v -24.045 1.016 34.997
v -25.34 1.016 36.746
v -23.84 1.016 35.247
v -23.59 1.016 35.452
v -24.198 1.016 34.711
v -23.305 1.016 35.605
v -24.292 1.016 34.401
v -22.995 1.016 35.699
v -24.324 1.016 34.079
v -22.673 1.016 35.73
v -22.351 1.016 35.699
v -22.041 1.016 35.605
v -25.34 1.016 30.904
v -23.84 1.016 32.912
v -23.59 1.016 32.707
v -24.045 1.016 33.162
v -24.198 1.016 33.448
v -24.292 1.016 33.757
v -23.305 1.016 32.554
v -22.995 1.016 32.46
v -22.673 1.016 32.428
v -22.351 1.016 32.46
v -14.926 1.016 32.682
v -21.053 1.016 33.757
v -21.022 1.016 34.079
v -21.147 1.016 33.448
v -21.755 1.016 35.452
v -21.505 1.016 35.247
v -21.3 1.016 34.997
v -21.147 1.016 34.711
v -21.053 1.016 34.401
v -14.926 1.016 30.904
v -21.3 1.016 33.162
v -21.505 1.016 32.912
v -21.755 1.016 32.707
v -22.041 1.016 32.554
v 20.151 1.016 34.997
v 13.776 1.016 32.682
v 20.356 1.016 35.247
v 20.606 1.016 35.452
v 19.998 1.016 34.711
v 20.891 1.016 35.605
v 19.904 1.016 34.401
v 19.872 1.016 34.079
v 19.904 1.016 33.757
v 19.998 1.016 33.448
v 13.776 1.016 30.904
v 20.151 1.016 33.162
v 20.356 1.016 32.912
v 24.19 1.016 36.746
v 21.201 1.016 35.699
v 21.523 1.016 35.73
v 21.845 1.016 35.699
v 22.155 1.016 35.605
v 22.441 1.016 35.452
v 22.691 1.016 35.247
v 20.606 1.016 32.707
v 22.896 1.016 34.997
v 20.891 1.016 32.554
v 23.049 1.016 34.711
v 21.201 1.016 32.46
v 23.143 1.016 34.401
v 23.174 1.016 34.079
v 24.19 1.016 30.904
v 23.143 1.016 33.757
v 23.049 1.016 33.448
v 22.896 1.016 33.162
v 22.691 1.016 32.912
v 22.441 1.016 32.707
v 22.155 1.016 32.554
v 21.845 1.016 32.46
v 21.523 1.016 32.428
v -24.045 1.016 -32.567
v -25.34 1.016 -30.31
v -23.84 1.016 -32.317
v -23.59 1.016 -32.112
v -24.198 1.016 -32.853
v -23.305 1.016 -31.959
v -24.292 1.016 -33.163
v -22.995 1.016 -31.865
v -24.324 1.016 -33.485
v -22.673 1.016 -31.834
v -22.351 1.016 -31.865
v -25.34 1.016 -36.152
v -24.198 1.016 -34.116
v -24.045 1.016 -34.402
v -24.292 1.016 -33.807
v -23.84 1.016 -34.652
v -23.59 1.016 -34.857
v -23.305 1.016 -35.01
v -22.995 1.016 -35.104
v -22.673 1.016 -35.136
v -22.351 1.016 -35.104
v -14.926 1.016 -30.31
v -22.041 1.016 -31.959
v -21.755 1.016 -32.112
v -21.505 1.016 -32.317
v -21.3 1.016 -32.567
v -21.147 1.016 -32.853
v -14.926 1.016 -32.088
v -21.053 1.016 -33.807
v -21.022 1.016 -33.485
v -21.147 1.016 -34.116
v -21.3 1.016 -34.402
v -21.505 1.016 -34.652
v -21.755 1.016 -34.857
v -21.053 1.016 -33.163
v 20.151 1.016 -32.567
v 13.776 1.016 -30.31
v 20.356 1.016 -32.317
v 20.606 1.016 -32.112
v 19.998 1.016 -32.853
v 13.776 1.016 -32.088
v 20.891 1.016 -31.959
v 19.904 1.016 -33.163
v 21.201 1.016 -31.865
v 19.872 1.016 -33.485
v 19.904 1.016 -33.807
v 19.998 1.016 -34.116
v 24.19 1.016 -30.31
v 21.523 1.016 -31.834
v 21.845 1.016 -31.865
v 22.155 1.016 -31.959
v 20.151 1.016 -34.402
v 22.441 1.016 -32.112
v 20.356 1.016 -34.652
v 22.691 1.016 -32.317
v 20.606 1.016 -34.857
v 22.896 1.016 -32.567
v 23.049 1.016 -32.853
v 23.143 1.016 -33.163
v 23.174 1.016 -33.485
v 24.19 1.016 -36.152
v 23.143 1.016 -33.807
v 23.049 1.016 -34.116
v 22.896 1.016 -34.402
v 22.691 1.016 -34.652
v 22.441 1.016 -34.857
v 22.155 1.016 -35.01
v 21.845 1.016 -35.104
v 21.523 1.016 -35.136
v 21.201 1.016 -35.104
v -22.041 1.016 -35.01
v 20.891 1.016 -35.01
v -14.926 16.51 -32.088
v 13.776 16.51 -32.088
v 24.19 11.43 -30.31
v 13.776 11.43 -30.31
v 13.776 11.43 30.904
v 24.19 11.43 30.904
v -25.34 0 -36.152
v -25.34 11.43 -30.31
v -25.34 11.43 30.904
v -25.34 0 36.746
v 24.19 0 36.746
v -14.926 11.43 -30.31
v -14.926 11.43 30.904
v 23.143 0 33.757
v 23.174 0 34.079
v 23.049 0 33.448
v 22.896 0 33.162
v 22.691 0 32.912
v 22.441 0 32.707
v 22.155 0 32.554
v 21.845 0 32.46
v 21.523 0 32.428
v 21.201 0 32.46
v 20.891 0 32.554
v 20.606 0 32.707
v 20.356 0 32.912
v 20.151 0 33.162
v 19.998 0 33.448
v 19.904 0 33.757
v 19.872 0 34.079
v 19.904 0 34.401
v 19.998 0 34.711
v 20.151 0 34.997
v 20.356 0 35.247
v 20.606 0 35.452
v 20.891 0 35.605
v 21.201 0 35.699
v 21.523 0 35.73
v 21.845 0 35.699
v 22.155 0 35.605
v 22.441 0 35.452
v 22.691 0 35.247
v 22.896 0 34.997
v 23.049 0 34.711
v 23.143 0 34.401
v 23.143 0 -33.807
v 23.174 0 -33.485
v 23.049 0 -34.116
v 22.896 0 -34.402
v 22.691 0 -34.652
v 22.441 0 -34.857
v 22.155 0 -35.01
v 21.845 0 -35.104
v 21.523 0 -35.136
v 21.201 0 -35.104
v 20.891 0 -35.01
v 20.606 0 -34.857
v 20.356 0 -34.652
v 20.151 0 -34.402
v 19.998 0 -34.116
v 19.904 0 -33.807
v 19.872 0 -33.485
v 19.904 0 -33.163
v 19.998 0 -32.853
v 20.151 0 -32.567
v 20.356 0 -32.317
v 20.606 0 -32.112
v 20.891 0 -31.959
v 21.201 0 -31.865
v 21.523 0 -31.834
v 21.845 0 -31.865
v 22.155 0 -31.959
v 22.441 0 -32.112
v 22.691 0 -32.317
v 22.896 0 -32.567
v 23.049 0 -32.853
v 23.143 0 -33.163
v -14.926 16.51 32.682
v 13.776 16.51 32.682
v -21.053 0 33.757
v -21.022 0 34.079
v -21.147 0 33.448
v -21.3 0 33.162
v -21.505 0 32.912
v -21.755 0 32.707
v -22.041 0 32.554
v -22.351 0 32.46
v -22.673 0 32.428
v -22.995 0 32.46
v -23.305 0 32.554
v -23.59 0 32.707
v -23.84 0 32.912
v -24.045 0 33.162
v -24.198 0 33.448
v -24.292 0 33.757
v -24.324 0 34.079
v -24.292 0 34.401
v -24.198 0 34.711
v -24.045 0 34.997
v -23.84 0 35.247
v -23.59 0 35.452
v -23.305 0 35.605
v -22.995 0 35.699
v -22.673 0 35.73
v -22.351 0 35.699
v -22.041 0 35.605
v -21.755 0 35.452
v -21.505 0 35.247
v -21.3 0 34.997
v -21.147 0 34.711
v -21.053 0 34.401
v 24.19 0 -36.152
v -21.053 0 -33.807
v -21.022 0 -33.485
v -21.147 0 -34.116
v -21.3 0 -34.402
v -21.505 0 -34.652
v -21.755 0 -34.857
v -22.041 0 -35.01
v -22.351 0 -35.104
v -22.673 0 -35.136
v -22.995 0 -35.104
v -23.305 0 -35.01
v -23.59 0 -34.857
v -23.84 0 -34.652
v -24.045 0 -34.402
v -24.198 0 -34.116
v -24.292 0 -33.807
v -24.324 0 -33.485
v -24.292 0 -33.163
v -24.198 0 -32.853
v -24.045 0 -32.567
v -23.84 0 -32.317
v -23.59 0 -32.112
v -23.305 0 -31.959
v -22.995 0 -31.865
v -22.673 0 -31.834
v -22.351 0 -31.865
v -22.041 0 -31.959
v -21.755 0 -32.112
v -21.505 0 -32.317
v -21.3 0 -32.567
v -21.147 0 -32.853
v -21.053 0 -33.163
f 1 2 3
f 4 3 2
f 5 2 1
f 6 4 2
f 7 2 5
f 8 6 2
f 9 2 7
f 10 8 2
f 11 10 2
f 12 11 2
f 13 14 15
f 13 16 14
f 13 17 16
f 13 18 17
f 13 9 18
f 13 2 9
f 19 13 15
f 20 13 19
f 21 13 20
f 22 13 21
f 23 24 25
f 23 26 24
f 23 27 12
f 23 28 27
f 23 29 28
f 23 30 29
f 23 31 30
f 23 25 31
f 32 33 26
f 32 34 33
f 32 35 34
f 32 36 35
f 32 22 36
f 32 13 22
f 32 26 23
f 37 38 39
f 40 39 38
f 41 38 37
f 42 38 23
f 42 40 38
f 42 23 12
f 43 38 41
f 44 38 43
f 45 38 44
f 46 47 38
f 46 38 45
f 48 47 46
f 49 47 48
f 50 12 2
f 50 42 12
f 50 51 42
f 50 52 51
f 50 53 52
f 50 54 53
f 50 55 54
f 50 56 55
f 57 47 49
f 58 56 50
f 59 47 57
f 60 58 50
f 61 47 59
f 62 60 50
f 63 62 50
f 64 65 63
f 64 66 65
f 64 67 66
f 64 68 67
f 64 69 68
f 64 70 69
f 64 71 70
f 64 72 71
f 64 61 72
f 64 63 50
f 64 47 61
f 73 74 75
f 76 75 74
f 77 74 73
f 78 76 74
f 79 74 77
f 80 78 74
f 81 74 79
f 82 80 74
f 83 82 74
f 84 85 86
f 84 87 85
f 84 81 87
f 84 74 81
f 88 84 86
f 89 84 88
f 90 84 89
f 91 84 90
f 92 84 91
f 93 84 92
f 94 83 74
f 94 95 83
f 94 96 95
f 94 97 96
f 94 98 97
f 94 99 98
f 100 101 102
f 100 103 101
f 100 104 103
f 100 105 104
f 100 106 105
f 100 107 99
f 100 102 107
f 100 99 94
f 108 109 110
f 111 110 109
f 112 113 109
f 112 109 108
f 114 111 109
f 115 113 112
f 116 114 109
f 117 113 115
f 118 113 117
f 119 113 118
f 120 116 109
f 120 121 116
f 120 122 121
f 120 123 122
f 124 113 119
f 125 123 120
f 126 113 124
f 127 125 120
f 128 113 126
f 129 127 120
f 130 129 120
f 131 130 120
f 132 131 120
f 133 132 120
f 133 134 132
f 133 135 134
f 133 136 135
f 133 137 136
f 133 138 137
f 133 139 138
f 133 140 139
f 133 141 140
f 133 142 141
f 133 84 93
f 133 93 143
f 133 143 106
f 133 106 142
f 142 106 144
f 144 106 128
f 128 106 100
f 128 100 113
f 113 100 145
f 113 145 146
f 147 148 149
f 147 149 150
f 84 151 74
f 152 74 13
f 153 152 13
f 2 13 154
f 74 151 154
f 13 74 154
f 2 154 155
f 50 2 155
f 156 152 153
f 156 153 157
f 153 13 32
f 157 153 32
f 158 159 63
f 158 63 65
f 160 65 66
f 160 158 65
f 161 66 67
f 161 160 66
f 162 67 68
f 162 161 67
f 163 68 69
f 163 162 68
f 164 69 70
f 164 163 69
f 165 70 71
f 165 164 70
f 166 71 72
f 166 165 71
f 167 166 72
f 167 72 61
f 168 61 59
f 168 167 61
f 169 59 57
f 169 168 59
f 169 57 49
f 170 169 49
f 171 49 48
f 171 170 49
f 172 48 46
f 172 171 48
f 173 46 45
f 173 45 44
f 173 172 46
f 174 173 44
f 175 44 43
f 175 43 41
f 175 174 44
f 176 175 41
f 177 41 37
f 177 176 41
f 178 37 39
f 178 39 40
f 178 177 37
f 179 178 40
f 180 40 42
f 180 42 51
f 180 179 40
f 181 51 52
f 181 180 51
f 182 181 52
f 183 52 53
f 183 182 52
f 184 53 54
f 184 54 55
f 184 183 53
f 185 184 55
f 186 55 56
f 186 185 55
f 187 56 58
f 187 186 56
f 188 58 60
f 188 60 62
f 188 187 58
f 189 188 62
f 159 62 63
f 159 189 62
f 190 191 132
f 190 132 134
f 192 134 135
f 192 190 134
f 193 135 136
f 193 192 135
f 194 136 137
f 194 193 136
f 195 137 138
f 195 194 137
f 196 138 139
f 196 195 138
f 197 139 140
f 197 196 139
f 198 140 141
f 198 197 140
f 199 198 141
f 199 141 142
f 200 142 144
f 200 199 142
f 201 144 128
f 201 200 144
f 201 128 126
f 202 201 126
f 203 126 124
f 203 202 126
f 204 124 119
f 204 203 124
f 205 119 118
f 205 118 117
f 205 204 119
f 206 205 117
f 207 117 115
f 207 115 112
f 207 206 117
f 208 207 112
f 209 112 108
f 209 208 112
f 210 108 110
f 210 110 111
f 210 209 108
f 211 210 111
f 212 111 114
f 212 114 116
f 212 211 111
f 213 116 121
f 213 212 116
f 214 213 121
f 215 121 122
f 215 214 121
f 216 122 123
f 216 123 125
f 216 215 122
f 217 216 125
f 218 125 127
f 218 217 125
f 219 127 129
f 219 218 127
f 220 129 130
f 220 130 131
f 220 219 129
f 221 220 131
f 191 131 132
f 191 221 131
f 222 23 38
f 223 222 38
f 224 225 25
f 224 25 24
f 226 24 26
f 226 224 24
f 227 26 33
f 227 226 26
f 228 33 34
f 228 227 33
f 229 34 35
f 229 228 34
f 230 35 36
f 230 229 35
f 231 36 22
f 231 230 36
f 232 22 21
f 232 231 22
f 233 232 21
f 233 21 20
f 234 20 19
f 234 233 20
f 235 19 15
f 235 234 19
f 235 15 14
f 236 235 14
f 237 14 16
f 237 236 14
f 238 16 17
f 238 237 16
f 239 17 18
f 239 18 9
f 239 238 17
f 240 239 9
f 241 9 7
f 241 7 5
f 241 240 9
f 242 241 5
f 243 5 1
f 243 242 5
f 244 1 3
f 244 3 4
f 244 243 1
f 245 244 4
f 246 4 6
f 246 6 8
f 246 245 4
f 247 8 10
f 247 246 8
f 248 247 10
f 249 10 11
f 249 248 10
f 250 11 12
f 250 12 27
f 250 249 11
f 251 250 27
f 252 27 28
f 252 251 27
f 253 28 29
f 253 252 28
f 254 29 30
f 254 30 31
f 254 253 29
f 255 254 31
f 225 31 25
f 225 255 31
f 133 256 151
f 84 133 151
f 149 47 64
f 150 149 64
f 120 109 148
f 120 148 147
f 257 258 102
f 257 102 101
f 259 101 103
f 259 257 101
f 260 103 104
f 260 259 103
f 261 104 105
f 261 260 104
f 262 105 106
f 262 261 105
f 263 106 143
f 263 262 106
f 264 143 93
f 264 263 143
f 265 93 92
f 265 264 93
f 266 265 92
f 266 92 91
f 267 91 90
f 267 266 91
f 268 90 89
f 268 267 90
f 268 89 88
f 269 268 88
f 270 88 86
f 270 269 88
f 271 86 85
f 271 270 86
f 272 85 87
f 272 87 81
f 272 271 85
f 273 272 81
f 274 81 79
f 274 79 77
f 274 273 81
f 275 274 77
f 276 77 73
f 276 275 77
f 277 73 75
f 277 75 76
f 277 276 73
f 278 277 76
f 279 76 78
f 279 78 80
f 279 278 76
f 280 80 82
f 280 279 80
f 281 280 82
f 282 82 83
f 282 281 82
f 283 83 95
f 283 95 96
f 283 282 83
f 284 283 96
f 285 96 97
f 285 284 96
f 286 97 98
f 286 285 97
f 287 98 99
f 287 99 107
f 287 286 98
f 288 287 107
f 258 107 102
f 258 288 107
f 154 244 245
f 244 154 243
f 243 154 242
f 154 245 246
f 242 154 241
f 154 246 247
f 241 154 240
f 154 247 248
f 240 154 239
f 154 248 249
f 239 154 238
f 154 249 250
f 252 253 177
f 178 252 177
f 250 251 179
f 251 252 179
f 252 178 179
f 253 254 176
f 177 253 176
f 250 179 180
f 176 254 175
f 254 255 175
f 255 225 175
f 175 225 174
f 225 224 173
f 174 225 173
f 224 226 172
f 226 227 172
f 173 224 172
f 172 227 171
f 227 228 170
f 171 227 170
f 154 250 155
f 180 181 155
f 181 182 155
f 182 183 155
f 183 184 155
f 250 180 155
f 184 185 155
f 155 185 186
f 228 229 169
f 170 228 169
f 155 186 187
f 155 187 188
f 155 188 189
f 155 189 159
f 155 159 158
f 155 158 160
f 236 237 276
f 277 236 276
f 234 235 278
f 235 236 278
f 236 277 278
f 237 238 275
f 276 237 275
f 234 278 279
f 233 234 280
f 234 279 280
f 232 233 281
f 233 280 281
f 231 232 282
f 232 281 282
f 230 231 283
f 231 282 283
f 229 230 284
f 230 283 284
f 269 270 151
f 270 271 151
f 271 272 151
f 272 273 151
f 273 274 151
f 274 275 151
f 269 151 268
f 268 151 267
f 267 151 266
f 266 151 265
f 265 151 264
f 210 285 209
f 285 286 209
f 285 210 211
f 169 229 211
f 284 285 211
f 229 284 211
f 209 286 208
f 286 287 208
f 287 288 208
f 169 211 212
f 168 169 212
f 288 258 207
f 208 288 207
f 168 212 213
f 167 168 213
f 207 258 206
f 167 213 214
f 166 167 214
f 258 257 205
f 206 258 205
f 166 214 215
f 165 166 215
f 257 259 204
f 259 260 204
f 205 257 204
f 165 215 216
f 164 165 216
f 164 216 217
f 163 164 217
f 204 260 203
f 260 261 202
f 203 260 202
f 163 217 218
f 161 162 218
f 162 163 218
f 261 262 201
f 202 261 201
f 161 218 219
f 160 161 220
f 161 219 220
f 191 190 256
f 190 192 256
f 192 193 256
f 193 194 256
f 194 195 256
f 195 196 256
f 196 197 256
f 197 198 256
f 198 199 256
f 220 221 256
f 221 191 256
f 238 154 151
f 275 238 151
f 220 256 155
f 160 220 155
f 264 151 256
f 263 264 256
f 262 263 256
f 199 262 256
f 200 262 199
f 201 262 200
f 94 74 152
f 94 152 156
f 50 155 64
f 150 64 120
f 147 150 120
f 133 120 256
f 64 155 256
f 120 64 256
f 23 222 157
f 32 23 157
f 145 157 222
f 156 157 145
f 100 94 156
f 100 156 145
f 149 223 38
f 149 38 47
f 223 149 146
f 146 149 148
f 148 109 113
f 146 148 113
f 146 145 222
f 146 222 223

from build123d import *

# Parameters (mm, degrees)
BOSS_EXTRUDE1_DEPTH = 16.51
SKETCH1_6_W         = 10.414
SKETCH1_6_H         = 61.214
BOSS_EXTRUDE2_DEPTH = 11.43
SKETCH1_7_R         = 1.651
BOSS_EXTRUDE3_DEPTH = 1.016


with BuildPart() as part:
    # Sketch1 → Boss-Extrude1 (new body)
    with BuildSketch(Plane(origin=(0, 0, 0), x_dir=(1, 0, 0), z_dir=(0, 1, 0))):
        Polygon((-14.925727978, 32.087664761), (-14.925727978, 30.309664761), (-14.925727978, -30.904335239), (-14.925727978, -32.682335239), (13.776272022, -32.682335239), (13.776272022, -30.904335239), (13.776272022, 30.309664761), (13.776272022, 32.087664761), align=None)
    extrude(amount=BOSS_EXTRUDE1_DEPTH)

    # Sketch1<6> → Boss-Extrude2 (add)
    with BuildSketch(Plane(origin=(0, 0, 0), x_dir=(1, 0, 0), z_dir=(0, 1, 0))):
        with Locations((-20.132727978, -0.297335239)):
            Rectangle(SKETCH1_6_W, SKETCH1_6_H)
        with Locations((18.983272022, -0.297335239)):
            Rectangle(SKETCH1_6_W, SKETCH1_6_H)
    extrude(amount=BOSS_EXTRUDE2_DEPTH)

    # Sketch1<7> → Boss-Extrude3 (add)
    # profile 1 of 2: a face of its own
    with BuildSketch(Plane(origin=(0, 0, 0), x_dir=(1, 0, 0), z_dir=(0, 1, 0))):
        Polygon((-25.339727978, 36.151664761), (-25.339727978, 30.309664761), (-14.925727978, 30.309664761), (-14.925727978, 32.087664761), (13.776272022, 32.087664761), (13.776272022, 30.309664761), (24.190272022, 30.309664761), (24.190272022, 36.151664761), align=None)
        with Locations((-22.672727978, 33.484664761)):
            Circle(SKETCH1_7_R, mode=Mode.SUBTRACT)
        with Locations((21.523272022, 33.484664761)):
            Circle(SKETCH1_7_R, mode=Mode.SUBTRACT)
    # profile 2 of 2: a face of its own
    with BuildSketch(Plane(origin=(0, 0, 0), x_dir=(1, 0, 0), z_dir=(0, 1, 0))):
        Polygon((-14.925727978, -30.904335239), (-25.339727978, -30.904335239), (-25.339727978, -36.746335239), (24.190272022, -36.746335239), (24.190272022, -30.904335239), (13.776272022, -30.904335239), (13.776272022, -32.682335239), (-14.925727978, -32.682335239), align=None)
        with Locations((-22.672727978, -34.079335239)):
            Circle(SKETCH1_7_R, mode=Mode.SUBTRACT)
        with Locations((21.523272022, -34.079335239)):
            Circle(SKETCH1_7_R, mode=Mode.SUBTRACT)
    extrude(amount=BOSS_EXTRUDE3_DEPTH)


solid = part.part
